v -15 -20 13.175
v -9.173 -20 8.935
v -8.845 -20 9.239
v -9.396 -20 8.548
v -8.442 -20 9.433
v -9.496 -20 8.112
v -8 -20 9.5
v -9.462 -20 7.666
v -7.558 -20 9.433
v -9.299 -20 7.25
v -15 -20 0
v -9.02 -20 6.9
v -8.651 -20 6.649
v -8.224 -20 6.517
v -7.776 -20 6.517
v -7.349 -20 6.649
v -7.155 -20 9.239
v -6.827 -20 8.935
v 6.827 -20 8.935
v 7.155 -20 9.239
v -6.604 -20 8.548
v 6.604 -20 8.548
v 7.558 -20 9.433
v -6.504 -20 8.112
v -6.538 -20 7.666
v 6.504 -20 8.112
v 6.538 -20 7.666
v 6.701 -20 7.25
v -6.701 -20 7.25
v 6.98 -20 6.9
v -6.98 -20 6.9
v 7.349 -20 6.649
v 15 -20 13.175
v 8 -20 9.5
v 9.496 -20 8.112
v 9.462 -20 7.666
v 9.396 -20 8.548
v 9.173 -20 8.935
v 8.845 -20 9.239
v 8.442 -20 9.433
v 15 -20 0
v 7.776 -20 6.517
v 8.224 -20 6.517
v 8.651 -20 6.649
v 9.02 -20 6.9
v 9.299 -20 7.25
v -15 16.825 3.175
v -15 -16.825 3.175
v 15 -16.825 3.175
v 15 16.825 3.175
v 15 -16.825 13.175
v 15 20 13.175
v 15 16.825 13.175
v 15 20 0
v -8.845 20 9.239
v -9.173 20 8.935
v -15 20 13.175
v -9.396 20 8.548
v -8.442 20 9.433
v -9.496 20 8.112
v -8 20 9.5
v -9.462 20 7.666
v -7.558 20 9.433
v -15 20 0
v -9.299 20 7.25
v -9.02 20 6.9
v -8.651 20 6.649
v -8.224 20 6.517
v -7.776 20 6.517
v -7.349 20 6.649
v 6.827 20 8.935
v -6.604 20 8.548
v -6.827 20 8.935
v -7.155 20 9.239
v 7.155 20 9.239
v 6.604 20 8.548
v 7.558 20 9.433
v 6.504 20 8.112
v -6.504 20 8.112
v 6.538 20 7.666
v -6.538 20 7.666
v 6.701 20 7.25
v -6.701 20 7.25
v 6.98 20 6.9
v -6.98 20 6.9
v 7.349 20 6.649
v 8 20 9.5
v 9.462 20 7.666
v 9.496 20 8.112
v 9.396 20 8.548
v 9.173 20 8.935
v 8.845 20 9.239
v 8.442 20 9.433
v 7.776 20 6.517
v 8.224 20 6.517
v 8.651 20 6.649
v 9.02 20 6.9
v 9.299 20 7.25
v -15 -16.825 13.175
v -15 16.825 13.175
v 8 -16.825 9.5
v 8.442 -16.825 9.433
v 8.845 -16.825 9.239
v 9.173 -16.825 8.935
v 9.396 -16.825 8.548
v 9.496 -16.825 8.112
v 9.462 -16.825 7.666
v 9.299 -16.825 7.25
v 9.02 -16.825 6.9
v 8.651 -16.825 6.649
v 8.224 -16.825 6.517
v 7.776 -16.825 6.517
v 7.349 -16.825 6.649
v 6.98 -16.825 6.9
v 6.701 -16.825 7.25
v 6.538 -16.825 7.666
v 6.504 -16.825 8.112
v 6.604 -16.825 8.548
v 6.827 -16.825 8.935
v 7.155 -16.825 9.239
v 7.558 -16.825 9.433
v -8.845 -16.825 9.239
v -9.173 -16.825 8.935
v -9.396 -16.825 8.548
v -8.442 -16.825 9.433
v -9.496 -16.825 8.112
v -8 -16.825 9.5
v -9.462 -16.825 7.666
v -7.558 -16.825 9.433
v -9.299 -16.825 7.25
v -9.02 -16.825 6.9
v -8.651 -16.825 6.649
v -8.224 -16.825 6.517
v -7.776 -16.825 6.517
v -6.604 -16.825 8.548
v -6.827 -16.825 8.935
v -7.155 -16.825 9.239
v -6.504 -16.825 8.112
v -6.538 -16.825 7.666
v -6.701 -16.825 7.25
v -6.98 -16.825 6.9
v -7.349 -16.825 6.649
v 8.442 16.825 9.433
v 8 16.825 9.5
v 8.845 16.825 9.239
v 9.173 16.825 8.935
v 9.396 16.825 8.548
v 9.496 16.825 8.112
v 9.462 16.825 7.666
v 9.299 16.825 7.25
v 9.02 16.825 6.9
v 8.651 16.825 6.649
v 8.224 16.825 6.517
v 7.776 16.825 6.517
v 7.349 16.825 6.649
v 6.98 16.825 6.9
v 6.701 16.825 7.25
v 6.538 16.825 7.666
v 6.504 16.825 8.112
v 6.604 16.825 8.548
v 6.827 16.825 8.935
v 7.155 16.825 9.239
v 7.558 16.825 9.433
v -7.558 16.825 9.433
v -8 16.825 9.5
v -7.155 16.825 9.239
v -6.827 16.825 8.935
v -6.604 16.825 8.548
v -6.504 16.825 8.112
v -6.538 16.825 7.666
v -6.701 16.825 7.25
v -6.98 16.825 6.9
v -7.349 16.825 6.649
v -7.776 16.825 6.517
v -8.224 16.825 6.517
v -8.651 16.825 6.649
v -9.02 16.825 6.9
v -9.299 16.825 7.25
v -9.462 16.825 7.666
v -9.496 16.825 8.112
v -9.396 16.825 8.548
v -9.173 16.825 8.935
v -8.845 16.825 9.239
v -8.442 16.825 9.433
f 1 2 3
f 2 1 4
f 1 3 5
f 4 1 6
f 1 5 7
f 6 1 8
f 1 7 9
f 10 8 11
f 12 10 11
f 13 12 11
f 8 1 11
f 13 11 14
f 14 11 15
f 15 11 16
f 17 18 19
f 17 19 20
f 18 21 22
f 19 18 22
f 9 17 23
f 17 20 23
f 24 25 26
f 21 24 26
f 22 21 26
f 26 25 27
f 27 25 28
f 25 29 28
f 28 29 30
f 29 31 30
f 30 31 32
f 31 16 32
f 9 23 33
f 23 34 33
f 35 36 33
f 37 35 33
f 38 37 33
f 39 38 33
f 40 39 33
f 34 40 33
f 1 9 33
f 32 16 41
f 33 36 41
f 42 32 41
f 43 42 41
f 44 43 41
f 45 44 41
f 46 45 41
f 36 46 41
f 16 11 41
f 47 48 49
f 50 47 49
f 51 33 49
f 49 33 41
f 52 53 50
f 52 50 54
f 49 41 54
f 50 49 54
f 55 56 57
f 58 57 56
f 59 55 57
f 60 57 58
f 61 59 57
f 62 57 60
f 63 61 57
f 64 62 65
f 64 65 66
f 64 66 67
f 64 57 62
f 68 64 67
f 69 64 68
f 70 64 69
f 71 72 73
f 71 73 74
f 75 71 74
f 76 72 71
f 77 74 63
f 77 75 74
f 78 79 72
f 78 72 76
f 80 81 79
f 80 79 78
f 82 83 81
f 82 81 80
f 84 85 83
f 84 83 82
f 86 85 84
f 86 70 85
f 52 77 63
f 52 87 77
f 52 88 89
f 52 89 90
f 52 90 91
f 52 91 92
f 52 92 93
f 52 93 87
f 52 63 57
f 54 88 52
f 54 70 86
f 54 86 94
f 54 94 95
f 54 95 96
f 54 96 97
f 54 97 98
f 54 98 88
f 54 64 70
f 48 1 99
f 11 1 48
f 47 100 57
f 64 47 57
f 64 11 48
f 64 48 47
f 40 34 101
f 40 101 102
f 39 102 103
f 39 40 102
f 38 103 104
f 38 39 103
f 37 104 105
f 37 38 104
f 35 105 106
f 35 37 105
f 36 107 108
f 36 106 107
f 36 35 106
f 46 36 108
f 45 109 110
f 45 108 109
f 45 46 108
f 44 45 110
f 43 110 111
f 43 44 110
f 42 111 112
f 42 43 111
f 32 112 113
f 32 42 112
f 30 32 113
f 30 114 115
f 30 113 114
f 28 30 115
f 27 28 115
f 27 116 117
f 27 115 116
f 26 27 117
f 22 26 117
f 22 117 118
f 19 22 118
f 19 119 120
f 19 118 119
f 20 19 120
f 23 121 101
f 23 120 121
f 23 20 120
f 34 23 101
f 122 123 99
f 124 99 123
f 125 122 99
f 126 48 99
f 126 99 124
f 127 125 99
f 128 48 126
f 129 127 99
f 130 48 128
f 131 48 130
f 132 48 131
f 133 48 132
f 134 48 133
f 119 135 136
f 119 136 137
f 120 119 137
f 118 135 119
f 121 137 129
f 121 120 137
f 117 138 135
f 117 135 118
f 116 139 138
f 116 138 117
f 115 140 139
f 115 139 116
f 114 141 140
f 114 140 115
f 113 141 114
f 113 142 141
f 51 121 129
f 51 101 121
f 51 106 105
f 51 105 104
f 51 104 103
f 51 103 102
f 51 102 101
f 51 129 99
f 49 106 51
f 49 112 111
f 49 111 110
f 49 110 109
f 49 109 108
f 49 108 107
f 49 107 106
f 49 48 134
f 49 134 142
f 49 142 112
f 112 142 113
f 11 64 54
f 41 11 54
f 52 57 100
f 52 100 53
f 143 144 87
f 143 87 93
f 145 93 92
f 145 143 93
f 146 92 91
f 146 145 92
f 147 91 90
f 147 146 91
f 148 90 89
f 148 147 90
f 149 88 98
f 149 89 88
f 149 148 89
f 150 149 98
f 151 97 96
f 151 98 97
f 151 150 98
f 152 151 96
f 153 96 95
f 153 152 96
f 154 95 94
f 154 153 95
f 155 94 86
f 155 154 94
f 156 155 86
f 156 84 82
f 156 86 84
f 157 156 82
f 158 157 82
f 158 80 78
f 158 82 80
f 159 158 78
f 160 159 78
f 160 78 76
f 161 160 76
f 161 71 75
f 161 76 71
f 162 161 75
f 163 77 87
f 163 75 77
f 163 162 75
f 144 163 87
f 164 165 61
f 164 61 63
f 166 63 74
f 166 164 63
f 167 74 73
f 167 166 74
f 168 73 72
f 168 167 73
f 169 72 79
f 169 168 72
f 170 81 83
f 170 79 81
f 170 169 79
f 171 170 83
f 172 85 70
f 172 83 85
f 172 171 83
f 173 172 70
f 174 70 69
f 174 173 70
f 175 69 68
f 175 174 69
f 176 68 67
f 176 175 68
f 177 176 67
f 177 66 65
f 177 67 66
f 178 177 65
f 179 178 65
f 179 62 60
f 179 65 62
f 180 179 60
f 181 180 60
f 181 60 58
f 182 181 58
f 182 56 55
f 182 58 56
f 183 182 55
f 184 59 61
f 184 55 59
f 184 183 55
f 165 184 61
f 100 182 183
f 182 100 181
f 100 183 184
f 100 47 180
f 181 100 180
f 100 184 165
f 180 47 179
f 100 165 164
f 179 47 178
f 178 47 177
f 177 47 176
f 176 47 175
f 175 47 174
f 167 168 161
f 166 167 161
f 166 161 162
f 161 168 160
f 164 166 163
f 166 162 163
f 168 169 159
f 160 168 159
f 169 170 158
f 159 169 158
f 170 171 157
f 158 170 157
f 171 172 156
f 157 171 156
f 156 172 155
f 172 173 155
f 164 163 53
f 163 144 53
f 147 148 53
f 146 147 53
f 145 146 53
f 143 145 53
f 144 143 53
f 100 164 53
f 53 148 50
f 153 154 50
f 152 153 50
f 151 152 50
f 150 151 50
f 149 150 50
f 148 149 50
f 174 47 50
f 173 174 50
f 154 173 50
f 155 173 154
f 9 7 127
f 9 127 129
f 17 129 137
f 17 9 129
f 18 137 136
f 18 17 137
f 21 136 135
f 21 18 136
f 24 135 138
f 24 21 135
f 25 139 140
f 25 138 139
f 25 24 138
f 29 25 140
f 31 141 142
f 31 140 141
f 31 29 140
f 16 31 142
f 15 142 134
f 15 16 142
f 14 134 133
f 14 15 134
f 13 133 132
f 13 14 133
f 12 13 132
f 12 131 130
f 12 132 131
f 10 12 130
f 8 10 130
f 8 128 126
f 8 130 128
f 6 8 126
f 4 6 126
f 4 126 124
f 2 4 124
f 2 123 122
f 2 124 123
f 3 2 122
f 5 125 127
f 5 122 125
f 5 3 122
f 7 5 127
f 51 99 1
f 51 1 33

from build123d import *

# Parameters (mm, degrees)
SKETCH1_W               = 30
SKETCH1_H               = 40
BOSS_EXTRUDE1_DEPTH     = 3.175
SKETCH3_W               = 30
SKETCH3_H               = 3.175
BOSS_EXTRUDE2_DEPTH     = 10
CUT_EXTRUDE1_DEPTH      = 45.705487639
CUT_EXTRUDE1_DEPTH_BACK = 45.705487639
SKETCH4_R               = 1.5


with BuildPart() as part:
    # Sketch1 → Boss-Extrude1 (new body)
    with BuildSketch(Plane.XY):
        Rectangle(SKETCH1_W, SKETCH1_H)
    extrude(amount=BOSS_EXTRUDE1_DEPTH)

    # Sketch3 → Boss-Extrude2 (add)
    with BuildSketch(Plane.XY.offset(3.175)):
        with Locations((0, 18.4125)):
            Rectangle(SKETCH3_W, SKETCH3_H)
        with Locations((0, -18.4125)):
            Rectangle(SKETCH3_W, SKETCH3_H)
    extrude(amount=BOSS_EXTRUDE2_DEPTH)

    # Sketch4 → Cut-Extrude1 (cut, two sides: drawn at the far end of the back side and taken through both)
    with BuildSketch(Plane(origin=(0, 20, 0), x_dir=(1, 0, 0), z_dir=(0, 1, 0)).offset(-CUT_EXTRUDE1_DEPTH_BACK)):
        with Locations(Location((-8, -8, 0), (0, 0, 270))):
            Circle(SKETCH4_R)
        with Locations(Location((8, -8, 0), (0, 0, 270))):
            Circle(SKETCH4_R)
    extrude(amount=CUT_EXTRUDE1_DEPTH + CUT_EXTRUDE1_DEPTH_BACK, mode=Mode.SUBTRACT)


solid = part.part
